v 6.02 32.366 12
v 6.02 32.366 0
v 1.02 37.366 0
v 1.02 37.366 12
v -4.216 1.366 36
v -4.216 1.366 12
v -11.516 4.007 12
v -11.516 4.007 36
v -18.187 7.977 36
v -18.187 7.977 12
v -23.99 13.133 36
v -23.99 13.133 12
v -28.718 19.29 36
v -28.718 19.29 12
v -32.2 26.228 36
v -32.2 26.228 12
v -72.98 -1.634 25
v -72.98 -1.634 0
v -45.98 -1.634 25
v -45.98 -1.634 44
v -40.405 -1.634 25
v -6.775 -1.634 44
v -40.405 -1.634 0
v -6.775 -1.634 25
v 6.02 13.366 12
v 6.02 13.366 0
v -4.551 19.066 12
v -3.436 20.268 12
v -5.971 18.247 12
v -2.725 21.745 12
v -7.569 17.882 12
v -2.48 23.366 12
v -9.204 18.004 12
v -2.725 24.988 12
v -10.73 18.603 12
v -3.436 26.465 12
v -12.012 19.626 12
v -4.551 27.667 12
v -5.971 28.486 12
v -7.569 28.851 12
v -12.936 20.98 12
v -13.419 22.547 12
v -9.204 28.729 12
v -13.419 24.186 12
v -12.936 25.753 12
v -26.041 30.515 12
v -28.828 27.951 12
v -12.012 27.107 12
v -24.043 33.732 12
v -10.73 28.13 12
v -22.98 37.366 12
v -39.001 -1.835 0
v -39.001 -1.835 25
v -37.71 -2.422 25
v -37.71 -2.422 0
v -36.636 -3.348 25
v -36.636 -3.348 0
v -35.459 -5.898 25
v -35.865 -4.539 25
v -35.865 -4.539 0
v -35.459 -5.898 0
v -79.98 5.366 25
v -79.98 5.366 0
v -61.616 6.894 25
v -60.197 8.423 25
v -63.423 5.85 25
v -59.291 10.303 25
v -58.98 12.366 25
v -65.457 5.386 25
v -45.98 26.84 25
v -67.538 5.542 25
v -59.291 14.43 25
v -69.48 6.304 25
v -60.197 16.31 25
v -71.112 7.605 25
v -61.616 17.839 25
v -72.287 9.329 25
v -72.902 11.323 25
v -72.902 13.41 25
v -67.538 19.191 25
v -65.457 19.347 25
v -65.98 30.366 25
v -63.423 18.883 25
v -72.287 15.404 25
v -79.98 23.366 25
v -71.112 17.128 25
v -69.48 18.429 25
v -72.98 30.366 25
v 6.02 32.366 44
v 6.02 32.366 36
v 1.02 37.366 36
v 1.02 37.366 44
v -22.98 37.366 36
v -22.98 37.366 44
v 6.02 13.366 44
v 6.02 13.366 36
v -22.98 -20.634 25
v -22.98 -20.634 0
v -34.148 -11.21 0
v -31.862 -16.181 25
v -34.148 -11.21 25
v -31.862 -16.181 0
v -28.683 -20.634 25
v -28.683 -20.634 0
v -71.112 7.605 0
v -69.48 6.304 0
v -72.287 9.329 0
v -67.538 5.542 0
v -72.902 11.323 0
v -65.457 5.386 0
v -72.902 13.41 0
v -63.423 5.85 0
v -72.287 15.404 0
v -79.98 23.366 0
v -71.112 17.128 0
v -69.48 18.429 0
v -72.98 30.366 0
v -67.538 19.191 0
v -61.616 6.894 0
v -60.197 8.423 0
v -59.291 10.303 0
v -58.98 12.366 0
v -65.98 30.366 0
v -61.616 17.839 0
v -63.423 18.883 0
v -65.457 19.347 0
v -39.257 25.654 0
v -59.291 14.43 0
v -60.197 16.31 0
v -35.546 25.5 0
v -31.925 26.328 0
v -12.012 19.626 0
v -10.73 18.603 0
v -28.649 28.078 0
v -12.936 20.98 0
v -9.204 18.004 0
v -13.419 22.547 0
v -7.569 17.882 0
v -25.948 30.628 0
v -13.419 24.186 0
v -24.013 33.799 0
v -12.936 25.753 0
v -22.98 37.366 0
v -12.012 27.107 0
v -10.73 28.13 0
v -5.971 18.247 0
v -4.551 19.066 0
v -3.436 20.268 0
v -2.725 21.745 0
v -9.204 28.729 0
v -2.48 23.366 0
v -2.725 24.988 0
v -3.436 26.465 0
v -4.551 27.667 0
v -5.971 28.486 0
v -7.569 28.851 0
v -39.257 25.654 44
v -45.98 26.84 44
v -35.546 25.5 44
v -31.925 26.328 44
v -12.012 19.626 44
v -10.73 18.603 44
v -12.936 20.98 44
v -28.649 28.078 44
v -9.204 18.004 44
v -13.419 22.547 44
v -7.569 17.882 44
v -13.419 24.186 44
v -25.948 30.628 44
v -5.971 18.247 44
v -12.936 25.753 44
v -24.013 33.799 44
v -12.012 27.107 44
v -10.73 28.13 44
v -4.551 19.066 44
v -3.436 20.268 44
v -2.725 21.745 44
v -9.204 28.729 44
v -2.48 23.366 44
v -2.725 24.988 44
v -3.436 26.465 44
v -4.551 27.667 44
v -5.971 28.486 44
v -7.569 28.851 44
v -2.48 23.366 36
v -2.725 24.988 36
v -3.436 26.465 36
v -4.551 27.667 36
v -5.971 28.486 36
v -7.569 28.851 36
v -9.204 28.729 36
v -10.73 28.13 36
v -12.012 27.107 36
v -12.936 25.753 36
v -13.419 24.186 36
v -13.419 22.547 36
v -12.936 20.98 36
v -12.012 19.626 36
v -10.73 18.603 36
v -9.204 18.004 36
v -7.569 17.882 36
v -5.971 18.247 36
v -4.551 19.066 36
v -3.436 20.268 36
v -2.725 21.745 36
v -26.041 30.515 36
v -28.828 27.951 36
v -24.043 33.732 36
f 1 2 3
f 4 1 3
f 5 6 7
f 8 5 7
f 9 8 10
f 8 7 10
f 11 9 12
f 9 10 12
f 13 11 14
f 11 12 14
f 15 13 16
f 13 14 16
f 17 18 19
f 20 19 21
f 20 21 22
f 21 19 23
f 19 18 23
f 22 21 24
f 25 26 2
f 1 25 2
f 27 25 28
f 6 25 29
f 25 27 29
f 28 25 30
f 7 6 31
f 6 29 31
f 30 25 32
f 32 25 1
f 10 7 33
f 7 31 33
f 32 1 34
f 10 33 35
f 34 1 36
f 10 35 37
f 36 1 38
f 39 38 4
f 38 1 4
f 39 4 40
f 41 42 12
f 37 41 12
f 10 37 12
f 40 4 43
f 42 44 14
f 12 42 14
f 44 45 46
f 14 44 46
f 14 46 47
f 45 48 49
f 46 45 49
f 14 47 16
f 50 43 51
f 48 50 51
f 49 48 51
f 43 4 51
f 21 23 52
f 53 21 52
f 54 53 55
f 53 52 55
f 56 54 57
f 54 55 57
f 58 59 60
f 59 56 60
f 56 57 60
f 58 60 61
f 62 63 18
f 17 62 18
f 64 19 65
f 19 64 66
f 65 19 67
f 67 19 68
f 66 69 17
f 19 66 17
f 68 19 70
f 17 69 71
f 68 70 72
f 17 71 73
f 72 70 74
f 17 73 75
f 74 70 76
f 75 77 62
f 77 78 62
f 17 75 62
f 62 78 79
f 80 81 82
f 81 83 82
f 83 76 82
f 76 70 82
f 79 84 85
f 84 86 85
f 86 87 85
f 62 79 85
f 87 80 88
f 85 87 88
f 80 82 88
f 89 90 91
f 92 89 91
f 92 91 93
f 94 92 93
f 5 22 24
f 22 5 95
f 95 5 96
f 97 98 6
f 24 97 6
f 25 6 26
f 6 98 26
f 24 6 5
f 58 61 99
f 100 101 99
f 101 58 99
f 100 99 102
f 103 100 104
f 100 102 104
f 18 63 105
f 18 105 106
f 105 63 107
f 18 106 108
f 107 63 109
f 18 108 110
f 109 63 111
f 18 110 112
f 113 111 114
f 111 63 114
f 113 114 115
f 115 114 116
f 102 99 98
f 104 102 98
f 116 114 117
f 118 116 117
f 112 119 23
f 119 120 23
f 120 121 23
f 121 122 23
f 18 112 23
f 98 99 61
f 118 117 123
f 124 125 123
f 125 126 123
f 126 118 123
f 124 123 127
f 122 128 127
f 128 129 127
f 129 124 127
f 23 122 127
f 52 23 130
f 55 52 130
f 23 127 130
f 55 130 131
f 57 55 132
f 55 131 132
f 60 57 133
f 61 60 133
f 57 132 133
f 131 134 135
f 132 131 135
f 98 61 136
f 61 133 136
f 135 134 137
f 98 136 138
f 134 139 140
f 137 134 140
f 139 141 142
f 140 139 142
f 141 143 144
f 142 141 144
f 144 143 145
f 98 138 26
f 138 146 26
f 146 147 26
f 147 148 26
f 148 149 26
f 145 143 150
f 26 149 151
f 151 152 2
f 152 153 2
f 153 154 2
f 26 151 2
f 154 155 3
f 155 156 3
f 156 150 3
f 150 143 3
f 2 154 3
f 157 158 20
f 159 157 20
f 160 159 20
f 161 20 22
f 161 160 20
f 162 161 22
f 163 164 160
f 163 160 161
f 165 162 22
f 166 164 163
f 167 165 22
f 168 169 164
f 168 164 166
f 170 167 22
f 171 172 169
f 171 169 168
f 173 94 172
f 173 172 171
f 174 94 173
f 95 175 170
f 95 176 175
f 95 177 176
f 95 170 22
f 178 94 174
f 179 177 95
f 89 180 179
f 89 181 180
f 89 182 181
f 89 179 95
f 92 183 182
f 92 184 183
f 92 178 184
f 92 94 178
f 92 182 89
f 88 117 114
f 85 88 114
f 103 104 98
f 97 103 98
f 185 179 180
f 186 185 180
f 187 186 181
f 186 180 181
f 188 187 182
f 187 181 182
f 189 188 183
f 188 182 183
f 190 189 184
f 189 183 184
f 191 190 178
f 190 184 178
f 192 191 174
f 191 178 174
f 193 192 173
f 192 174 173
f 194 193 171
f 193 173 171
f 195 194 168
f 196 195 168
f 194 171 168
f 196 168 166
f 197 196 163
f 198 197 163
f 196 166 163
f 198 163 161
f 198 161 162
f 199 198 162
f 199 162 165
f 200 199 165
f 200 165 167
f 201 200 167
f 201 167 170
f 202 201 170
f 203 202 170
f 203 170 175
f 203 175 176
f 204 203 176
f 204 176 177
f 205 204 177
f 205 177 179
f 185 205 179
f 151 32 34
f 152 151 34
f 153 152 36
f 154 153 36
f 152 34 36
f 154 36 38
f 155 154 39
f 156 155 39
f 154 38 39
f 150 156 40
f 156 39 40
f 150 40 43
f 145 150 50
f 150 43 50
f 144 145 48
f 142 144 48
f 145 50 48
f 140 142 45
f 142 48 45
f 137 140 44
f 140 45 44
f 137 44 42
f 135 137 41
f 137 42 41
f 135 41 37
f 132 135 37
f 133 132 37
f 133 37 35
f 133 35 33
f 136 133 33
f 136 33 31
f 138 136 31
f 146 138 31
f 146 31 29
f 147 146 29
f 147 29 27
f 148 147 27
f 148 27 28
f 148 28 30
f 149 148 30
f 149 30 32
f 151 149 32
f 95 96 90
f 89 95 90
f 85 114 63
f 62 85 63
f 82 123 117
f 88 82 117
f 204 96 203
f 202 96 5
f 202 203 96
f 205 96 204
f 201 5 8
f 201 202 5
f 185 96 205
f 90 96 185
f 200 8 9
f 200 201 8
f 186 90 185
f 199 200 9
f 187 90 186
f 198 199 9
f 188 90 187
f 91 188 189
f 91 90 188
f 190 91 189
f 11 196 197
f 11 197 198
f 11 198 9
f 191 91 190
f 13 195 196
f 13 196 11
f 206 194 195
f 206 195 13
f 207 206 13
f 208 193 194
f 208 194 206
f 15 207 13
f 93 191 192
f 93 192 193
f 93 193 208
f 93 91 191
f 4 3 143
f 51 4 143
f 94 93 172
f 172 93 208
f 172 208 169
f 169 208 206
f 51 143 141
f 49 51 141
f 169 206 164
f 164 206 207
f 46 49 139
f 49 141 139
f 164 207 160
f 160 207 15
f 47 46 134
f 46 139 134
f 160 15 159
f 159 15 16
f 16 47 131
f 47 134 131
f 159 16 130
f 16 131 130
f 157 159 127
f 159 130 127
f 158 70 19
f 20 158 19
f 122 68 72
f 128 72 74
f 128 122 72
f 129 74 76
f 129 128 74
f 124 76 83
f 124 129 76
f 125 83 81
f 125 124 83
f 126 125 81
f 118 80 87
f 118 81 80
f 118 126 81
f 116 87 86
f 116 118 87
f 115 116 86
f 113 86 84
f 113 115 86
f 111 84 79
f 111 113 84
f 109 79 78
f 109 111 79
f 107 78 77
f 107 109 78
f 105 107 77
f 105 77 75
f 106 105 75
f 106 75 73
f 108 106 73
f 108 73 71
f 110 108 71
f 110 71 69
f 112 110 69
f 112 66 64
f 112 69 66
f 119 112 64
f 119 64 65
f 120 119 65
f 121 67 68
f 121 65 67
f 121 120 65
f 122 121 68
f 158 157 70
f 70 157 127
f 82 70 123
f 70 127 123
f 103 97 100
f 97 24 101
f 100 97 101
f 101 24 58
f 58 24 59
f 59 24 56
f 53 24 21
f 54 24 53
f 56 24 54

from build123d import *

# Parameters (mm, degrees)
SKETCH1_R           = 7
BOSS_EXTRUDE1_DEPTH = 44
SKETCH2_R           = 5.5
CUT_EXTRUDE1_DEPTH  = 99.636339936
CUT_EXTRUDE2_START  = -19
CUT_EXTRUDE2_DEPTH  = 19
CUT_EXTRUDE3_DEPTH  = 24


with BuildPart() as part:
    # Sketch1 → Boss-Extrude1 (new body)
    with BuildSketch(Plane.XY):
        with BuildLine():
            ThreePointArc((-40.404910175, -1.633500031), (-37.139674394, -2.846913799), (-35.459271434, -5.898205914))
            ThreePointArc((-35.459271434, -5.898205914), (-33.122441231, -13.749172092), (-28.683469034, -20.633500031))
            Line((-28.683469034, -20.633500031), (-22.980449087, -20.633500031))
            Line((-22.980449087, -20.633500031), (6.019550913, 13.366499969))
            Line((6.019550913, 13.366499969), (6.019550913, 32.366499969))
            Line((6.019550913, 32.366499969), (1.019550913, 37.366499969))
            Line((1.019550913, 37.366499969), (-22.980449087, 37.366499969))
            ThreePointArc((-22.980449087, 37.366499969), (-28.648710625, 28.077944899), (-39.256864445, 25.654410975))
            Line((-39.256864445, 25.654410975), (-65.980449087, 30.366499969))
            Line((-65.980449087, 30.366499969), (-72.980449087, 30.366499969))
            Line((-72.980449087, 30.366499969), (-79.980449087, 23.366499969))
            Line((-79.980449087, 23.366499969), (-79.980449087, 5.366499969))
            Line((-79.980449087, 5.366499969), (-72.980449087, -1.633500031))
            Line((-72.980449087, -1.633500031), (-40.404910175, -1.633500031))
        make_face()
        with Locations((-65.980449087, 12.366499969)):
            Circle(SKETCH1_R, mode=Mode.SUBTRACT)
    extrude(amount=BOSS_EXTRUDE1_DEPTH)

    # Sketch2 → Cut-Extrude1 (cut, through all)
    with BuildSketch(Plane.XY.offset(44)):
        with Locations((-7.980449087, 23.366499969)):
            Circle(SKETCH2_R)
    extrude(amount=-CUT_EXTRUDE1_DEPTH, mode=Mode.SUBTRACT)

    # Sketch3 → Cut-Extrude2 (cut)
    with BuildSketch(Plane.XY.offset(44).offset(CUT_EXTRUDE2_START)):
        Polygon((-45.980449087, 26.839960355), (-45.980449087, -1.633500031), (-72.980449087, -1.633500031), (-79.980449087, 5.366499969), (-79.980449087, 23.366499969), (-72.980449087, 30.366499969), (-65.980449087, 30.366499969), align=None)
        with BuildLine():
            Line((-40.404910175, -1.633500031), (-6.774566734, -1.633500031))
            Line((-6.774566734, -1.633500031), (-22.980449087, -20.633500031))
            Line((-22.980449087, -20.633500031), (-28.683469034, -20.633500031))
            ThreePointArc((-28.683469034, -20.633500031), (-33.122441231, -13.749172092), (-35.459271434, -5.898205914))
            ThreePointArc((-35.459271434, -5.898205914), (-37.139674394, -2.846913799), (-40.404910175, -1.633500031))
        make_face()
    extrude(amount=CUT_EXTRUDE2_DEPTH, mode=Mode.SUBTRACT)

    # Sketch7 → Cut-Extrude3 (cut)
    with BuildSketch(Plane(origin=(0, 0, 12), x_dir=(-1, 0, 0), z_dir=(0, 0, -1))):
        with BuildLine():
            Line((-6.019550913, 13.366499969), (4.215743204, 1.366499969))
            ThreePointArc((4.215743204, 1.366499969), (21.210918642, 10.417084234), (32.200340902, 26.227892629))
            ThreePointArc((32.200340902, 26.227892629), (26.041094158, 30.514775107), (22.980449087, 37.366499969))
            Line((22.980449087, 37.366499969), (-1.019550913, 37.366499969))
            Line((-1.019550913, 37.366499969), (-6.019550913, 32.366499969))
            Line((-6.019550913, 32.366499969), (-6.019550913, 13.366499969))
        make_face()
    extrude(amount=-CUT_EXTRUDE3_DEPTH, mode=Mode.SUBTRACT)


solid = part.part
